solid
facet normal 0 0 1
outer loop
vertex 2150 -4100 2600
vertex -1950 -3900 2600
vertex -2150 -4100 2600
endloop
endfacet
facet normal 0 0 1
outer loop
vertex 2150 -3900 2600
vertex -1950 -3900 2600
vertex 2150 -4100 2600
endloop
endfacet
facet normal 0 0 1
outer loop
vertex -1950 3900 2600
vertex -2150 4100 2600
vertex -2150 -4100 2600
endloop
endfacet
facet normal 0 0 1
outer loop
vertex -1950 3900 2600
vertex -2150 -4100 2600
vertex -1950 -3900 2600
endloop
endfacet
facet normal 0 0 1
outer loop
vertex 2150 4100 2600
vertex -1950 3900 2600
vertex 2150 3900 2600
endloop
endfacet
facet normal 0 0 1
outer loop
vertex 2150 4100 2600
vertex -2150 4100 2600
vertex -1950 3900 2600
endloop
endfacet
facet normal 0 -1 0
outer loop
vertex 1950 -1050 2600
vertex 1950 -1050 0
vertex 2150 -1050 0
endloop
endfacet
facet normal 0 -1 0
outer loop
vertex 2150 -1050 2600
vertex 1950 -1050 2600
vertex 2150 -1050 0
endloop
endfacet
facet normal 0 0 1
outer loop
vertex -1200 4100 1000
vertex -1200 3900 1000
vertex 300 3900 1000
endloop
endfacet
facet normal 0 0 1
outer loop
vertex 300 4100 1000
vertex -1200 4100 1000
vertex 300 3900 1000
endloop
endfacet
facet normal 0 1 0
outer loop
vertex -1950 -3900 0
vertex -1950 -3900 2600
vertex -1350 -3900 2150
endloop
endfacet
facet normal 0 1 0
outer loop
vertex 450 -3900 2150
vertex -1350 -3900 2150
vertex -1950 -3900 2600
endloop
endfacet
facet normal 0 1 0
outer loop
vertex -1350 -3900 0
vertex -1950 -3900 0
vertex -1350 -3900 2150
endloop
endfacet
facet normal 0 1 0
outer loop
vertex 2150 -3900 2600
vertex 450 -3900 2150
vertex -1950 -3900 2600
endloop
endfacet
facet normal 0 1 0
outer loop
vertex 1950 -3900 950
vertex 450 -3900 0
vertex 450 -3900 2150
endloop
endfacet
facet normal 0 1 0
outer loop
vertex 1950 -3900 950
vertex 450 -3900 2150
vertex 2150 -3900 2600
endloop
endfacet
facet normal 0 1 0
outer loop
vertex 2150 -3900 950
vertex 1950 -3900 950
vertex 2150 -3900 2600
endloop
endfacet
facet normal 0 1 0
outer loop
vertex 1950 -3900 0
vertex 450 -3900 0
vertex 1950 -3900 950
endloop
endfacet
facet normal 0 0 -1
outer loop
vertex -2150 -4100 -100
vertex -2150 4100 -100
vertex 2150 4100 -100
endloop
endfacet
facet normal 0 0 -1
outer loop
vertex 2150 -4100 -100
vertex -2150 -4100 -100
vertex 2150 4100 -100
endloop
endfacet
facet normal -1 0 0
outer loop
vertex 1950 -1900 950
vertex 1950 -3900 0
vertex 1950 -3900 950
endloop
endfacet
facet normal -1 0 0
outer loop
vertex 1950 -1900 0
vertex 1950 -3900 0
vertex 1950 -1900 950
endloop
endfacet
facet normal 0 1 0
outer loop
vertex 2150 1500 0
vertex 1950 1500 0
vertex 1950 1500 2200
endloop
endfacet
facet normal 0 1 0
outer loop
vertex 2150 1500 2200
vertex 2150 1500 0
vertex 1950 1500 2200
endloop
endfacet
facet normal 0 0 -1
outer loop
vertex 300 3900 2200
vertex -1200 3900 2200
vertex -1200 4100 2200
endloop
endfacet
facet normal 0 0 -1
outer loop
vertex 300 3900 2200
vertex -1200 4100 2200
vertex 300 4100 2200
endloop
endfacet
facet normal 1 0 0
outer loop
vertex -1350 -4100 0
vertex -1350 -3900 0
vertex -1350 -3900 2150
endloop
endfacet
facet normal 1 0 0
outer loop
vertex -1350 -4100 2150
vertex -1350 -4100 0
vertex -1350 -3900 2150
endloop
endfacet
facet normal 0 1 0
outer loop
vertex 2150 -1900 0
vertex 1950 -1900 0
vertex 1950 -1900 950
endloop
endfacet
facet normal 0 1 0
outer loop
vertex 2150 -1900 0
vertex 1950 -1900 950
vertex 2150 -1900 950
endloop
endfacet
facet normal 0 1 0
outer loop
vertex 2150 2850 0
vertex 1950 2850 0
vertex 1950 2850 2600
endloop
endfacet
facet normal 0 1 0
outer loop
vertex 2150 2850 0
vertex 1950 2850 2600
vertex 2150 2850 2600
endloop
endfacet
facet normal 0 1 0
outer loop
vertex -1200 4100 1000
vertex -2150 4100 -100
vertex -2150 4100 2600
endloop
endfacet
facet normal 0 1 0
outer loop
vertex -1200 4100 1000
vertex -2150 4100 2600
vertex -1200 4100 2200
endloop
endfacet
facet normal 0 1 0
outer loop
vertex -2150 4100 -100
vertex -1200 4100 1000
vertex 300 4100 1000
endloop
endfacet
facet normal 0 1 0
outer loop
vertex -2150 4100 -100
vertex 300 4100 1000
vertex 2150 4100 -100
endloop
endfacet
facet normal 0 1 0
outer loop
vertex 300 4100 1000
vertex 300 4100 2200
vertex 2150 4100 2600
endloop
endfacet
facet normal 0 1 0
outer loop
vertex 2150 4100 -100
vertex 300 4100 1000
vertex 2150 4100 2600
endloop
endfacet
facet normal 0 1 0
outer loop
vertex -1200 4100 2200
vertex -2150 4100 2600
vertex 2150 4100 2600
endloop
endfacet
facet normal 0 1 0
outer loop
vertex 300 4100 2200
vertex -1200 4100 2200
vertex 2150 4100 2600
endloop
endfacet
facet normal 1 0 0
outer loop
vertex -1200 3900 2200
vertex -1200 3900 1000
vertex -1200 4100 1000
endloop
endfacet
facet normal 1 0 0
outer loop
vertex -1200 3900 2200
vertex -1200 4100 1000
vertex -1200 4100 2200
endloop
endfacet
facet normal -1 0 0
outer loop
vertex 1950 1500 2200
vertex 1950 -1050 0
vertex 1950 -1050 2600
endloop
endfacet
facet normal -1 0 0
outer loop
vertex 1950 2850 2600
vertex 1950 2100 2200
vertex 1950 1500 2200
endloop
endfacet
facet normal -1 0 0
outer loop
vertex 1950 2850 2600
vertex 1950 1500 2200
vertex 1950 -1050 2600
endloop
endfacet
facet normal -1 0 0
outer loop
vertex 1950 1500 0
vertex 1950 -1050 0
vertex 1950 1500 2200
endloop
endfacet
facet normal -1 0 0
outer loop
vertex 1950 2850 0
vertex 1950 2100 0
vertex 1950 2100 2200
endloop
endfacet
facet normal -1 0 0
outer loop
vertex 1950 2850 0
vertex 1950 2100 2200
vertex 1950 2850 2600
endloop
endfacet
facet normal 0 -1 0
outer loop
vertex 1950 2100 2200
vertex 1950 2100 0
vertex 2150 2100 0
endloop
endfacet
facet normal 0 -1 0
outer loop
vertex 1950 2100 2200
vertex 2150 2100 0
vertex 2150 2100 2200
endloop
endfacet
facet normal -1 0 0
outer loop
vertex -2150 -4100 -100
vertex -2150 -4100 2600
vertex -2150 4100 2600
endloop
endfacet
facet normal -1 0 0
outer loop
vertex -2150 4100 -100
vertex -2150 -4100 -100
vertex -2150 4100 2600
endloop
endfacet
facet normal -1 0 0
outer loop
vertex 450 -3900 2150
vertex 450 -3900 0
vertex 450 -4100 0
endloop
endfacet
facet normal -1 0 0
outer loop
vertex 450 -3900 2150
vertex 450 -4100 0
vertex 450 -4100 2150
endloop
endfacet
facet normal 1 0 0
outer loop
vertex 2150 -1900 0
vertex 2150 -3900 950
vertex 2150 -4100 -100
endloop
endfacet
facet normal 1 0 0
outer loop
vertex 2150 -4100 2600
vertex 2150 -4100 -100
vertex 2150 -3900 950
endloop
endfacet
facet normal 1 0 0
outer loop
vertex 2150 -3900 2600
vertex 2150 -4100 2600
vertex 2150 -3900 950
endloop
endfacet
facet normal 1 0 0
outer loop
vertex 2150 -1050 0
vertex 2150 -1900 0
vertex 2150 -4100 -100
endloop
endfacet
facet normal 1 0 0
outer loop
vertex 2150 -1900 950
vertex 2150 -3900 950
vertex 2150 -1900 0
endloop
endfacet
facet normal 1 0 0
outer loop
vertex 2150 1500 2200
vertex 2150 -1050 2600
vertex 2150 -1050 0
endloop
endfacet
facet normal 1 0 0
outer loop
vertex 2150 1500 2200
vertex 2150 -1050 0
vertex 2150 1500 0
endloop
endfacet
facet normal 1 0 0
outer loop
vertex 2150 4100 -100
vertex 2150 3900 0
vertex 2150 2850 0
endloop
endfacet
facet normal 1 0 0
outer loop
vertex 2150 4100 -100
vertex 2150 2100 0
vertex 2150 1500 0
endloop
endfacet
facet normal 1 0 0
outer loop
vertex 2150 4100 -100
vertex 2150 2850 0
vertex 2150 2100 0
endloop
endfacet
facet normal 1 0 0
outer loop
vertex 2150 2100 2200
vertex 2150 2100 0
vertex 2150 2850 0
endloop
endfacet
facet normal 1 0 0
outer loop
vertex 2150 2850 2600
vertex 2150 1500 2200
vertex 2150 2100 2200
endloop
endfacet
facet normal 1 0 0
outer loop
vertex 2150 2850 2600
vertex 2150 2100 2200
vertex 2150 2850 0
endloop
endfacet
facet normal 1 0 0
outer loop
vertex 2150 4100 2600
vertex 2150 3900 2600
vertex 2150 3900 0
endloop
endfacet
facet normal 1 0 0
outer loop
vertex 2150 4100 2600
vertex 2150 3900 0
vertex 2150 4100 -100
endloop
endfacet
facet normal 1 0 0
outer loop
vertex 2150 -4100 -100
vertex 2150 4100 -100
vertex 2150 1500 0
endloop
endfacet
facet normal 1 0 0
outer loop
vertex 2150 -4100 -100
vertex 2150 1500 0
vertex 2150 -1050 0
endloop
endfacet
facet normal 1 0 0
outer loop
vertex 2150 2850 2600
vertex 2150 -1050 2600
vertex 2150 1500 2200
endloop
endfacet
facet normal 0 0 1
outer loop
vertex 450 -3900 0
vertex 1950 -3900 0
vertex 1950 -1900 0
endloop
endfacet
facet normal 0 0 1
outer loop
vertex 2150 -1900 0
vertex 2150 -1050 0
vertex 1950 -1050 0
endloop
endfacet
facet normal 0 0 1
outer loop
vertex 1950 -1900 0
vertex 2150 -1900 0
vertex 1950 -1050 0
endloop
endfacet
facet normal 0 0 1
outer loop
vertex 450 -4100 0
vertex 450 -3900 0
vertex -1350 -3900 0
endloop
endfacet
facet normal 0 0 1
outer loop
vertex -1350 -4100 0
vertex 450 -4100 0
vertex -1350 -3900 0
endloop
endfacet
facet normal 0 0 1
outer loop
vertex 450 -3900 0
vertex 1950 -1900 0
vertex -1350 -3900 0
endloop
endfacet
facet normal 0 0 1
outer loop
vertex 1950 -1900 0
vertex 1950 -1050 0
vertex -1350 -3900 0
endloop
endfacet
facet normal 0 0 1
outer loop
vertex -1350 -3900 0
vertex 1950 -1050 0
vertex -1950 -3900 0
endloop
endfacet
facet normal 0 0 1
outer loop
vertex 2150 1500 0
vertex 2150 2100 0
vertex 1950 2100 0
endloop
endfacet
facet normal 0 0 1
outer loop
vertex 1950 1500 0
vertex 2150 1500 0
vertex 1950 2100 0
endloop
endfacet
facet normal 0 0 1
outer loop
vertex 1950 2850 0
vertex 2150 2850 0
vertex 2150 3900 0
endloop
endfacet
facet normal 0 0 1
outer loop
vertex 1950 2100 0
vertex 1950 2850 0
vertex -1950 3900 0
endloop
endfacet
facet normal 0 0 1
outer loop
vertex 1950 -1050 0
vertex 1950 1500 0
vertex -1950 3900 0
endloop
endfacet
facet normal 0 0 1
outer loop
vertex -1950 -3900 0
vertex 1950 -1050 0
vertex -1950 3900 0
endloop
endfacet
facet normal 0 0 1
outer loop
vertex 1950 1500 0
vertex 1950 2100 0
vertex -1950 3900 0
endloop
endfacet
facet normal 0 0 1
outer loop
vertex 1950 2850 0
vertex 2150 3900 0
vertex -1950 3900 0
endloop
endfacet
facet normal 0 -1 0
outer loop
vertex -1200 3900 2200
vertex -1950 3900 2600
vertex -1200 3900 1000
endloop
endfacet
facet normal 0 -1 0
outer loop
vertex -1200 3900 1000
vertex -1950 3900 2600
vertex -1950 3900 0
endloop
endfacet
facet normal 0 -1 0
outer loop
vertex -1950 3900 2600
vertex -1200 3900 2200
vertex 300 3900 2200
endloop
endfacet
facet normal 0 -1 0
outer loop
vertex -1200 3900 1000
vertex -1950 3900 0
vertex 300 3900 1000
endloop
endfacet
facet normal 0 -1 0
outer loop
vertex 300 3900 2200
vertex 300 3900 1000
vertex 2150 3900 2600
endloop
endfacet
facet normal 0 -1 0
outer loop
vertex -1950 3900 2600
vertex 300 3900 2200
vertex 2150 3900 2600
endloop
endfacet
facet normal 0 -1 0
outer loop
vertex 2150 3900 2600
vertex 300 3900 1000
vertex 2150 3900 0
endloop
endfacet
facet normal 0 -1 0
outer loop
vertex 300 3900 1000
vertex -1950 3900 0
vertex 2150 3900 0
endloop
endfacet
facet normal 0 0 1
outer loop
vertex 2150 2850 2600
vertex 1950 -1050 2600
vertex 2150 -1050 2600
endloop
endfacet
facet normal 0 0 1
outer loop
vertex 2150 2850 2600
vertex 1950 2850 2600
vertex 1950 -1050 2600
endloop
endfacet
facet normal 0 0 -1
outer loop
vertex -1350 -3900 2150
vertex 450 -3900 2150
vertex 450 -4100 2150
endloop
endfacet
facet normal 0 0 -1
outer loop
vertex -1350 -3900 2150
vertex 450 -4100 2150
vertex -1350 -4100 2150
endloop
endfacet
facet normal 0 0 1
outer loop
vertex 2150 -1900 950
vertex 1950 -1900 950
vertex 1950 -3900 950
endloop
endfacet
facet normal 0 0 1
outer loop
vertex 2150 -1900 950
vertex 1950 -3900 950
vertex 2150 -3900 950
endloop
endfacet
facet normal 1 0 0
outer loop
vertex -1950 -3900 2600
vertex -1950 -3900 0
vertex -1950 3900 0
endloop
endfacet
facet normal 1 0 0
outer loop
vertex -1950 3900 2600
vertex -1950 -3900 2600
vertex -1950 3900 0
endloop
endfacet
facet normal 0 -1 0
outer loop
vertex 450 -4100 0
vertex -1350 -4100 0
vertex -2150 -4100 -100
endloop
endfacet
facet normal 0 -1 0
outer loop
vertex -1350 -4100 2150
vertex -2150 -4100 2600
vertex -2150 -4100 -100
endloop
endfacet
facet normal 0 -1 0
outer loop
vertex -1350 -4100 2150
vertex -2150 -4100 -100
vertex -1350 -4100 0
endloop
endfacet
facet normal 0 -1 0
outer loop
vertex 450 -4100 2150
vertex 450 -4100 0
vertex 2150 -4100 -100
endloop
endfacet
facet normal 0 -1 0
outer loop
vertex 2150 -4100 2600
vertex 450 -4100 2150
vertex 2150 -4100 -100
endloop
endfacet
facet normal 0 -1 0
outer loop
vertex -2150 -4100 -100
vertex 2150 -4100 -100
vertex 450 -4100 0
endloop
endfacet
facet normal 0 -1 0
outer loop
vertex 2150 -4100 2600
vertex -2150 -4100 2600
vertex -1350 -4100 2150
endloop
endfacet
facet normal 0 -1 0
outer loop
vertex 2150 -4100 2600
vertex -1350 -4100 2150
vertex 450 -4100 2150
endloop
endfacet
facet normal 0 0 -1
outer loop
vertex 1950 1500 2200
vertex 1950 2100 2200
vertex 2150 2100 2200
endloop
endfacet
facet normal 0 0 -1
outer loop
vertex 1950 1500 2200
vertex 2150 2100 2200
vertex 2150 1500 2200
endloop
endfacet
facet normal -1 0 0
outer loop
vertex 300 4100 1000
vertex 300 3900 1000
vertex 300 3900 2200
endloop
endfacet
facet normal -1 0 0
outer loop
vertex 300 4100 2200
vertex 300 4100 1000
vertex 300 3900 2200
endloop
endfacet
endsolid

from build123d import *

# Parameters (mm, degrees)
F0_W          = 3900
F0_H          = 7800
F1_DEPTH      = 100
F2_W          = 4300
F2_H          = 8200
F2_W_2        = 3900
F2_H_2        = 7800
F3_DEPTH      = 2600
F3_DEPTH_BACK = 100
F4_W          = 200
F4_H          = 1050
F4_H_2        = 2850
F5_DEPTH      = 2600.001
F6_W          = 1500
F6_H          = 1200
F7_DEPTH      = 200.001
F8_W          = 1800
F8_H          = 2150
F9_DEPTH      = 200.001
F10_W         = 600
F10_H         = 2200
F11_DEPTH     = 200.001
F12_W         = 200
F12_H         = 2000
F13_DEPTH     = 950


with BuildPart() as f1:
    # F0 (on Top) → F1 (new body)
    with BuildSketch(Plane.XY):
        Rectangle(F0_W, F0_H)
    extrude(amount=-F1_DEPTH)

    # F2 (on Top) → F3 (join, two sides)
    with BuildSketch(Plane.XY) as f3_sk:
        Rectangle(F2_W, F2_H)
        Rectangle(F2_W_2, F2_H_2, mode=Mode.SUBTRACT)
    extrude(amount=F3_DEPTH)
    extrude(f3_sk.sketch, amount=-F3_DEPTH_BACK)

    # F4 (on face) → F5 (cut, through all)
    with BuildSketch(Plane.XY):
        with Locations((2050, 3375)):
            Rectangle(F4_W, F4_H)
        with Locations((2050, -2475)):
            Rectangle(F4_W, F4_H_2)
    extrude(amount=F5_DEPTH, mode=Mode.SUBTRACT)

    # F6 (on face) → F7 (cut, through all)
    with BuildSketch(Plane.XZ.offset(-3900)):
        with Locations((-450, 1600)):
            Rectangle(F6_W, F6_H)
    extrude(amount=-F7_DEPTH, mode=Mode.SUBTRACT)

    # F8 (on face) → F9 (cut, through all)
    with BuildSketch(Plane(origin=(0, -3900, 0), x_dir=(-1, 0, 0), z_dir=(0, 1, 0))):
        with Locations((450, 1075)):
            Rectangle(F8_W, F8_H)
    extrude(amount=-F9_DEPTH, mode=Mode.SUBTRACT)

    # F10 (on face) → F11 (cut, through all)
    with BuildSketch(Plane(origin=(1950, 0, 0), x_dir=(0, -1, 0), z_dir=(-1, 0, 0))):
        with Locations((-1800, 1100)):
            Rectangle(F10_W, F10_H)
    extrude(amount=-F11_DEPTH, mode=Mode.SUBTRACT)

    # F12 (on face) → F13 (join)
    with BuildSketch(Plane.XY):
        with Locations((2050, -2900)):
            Rectangle(F12_W, F12_H)
    extrude(amount=F13_DEPTH)


solid = f1.part
